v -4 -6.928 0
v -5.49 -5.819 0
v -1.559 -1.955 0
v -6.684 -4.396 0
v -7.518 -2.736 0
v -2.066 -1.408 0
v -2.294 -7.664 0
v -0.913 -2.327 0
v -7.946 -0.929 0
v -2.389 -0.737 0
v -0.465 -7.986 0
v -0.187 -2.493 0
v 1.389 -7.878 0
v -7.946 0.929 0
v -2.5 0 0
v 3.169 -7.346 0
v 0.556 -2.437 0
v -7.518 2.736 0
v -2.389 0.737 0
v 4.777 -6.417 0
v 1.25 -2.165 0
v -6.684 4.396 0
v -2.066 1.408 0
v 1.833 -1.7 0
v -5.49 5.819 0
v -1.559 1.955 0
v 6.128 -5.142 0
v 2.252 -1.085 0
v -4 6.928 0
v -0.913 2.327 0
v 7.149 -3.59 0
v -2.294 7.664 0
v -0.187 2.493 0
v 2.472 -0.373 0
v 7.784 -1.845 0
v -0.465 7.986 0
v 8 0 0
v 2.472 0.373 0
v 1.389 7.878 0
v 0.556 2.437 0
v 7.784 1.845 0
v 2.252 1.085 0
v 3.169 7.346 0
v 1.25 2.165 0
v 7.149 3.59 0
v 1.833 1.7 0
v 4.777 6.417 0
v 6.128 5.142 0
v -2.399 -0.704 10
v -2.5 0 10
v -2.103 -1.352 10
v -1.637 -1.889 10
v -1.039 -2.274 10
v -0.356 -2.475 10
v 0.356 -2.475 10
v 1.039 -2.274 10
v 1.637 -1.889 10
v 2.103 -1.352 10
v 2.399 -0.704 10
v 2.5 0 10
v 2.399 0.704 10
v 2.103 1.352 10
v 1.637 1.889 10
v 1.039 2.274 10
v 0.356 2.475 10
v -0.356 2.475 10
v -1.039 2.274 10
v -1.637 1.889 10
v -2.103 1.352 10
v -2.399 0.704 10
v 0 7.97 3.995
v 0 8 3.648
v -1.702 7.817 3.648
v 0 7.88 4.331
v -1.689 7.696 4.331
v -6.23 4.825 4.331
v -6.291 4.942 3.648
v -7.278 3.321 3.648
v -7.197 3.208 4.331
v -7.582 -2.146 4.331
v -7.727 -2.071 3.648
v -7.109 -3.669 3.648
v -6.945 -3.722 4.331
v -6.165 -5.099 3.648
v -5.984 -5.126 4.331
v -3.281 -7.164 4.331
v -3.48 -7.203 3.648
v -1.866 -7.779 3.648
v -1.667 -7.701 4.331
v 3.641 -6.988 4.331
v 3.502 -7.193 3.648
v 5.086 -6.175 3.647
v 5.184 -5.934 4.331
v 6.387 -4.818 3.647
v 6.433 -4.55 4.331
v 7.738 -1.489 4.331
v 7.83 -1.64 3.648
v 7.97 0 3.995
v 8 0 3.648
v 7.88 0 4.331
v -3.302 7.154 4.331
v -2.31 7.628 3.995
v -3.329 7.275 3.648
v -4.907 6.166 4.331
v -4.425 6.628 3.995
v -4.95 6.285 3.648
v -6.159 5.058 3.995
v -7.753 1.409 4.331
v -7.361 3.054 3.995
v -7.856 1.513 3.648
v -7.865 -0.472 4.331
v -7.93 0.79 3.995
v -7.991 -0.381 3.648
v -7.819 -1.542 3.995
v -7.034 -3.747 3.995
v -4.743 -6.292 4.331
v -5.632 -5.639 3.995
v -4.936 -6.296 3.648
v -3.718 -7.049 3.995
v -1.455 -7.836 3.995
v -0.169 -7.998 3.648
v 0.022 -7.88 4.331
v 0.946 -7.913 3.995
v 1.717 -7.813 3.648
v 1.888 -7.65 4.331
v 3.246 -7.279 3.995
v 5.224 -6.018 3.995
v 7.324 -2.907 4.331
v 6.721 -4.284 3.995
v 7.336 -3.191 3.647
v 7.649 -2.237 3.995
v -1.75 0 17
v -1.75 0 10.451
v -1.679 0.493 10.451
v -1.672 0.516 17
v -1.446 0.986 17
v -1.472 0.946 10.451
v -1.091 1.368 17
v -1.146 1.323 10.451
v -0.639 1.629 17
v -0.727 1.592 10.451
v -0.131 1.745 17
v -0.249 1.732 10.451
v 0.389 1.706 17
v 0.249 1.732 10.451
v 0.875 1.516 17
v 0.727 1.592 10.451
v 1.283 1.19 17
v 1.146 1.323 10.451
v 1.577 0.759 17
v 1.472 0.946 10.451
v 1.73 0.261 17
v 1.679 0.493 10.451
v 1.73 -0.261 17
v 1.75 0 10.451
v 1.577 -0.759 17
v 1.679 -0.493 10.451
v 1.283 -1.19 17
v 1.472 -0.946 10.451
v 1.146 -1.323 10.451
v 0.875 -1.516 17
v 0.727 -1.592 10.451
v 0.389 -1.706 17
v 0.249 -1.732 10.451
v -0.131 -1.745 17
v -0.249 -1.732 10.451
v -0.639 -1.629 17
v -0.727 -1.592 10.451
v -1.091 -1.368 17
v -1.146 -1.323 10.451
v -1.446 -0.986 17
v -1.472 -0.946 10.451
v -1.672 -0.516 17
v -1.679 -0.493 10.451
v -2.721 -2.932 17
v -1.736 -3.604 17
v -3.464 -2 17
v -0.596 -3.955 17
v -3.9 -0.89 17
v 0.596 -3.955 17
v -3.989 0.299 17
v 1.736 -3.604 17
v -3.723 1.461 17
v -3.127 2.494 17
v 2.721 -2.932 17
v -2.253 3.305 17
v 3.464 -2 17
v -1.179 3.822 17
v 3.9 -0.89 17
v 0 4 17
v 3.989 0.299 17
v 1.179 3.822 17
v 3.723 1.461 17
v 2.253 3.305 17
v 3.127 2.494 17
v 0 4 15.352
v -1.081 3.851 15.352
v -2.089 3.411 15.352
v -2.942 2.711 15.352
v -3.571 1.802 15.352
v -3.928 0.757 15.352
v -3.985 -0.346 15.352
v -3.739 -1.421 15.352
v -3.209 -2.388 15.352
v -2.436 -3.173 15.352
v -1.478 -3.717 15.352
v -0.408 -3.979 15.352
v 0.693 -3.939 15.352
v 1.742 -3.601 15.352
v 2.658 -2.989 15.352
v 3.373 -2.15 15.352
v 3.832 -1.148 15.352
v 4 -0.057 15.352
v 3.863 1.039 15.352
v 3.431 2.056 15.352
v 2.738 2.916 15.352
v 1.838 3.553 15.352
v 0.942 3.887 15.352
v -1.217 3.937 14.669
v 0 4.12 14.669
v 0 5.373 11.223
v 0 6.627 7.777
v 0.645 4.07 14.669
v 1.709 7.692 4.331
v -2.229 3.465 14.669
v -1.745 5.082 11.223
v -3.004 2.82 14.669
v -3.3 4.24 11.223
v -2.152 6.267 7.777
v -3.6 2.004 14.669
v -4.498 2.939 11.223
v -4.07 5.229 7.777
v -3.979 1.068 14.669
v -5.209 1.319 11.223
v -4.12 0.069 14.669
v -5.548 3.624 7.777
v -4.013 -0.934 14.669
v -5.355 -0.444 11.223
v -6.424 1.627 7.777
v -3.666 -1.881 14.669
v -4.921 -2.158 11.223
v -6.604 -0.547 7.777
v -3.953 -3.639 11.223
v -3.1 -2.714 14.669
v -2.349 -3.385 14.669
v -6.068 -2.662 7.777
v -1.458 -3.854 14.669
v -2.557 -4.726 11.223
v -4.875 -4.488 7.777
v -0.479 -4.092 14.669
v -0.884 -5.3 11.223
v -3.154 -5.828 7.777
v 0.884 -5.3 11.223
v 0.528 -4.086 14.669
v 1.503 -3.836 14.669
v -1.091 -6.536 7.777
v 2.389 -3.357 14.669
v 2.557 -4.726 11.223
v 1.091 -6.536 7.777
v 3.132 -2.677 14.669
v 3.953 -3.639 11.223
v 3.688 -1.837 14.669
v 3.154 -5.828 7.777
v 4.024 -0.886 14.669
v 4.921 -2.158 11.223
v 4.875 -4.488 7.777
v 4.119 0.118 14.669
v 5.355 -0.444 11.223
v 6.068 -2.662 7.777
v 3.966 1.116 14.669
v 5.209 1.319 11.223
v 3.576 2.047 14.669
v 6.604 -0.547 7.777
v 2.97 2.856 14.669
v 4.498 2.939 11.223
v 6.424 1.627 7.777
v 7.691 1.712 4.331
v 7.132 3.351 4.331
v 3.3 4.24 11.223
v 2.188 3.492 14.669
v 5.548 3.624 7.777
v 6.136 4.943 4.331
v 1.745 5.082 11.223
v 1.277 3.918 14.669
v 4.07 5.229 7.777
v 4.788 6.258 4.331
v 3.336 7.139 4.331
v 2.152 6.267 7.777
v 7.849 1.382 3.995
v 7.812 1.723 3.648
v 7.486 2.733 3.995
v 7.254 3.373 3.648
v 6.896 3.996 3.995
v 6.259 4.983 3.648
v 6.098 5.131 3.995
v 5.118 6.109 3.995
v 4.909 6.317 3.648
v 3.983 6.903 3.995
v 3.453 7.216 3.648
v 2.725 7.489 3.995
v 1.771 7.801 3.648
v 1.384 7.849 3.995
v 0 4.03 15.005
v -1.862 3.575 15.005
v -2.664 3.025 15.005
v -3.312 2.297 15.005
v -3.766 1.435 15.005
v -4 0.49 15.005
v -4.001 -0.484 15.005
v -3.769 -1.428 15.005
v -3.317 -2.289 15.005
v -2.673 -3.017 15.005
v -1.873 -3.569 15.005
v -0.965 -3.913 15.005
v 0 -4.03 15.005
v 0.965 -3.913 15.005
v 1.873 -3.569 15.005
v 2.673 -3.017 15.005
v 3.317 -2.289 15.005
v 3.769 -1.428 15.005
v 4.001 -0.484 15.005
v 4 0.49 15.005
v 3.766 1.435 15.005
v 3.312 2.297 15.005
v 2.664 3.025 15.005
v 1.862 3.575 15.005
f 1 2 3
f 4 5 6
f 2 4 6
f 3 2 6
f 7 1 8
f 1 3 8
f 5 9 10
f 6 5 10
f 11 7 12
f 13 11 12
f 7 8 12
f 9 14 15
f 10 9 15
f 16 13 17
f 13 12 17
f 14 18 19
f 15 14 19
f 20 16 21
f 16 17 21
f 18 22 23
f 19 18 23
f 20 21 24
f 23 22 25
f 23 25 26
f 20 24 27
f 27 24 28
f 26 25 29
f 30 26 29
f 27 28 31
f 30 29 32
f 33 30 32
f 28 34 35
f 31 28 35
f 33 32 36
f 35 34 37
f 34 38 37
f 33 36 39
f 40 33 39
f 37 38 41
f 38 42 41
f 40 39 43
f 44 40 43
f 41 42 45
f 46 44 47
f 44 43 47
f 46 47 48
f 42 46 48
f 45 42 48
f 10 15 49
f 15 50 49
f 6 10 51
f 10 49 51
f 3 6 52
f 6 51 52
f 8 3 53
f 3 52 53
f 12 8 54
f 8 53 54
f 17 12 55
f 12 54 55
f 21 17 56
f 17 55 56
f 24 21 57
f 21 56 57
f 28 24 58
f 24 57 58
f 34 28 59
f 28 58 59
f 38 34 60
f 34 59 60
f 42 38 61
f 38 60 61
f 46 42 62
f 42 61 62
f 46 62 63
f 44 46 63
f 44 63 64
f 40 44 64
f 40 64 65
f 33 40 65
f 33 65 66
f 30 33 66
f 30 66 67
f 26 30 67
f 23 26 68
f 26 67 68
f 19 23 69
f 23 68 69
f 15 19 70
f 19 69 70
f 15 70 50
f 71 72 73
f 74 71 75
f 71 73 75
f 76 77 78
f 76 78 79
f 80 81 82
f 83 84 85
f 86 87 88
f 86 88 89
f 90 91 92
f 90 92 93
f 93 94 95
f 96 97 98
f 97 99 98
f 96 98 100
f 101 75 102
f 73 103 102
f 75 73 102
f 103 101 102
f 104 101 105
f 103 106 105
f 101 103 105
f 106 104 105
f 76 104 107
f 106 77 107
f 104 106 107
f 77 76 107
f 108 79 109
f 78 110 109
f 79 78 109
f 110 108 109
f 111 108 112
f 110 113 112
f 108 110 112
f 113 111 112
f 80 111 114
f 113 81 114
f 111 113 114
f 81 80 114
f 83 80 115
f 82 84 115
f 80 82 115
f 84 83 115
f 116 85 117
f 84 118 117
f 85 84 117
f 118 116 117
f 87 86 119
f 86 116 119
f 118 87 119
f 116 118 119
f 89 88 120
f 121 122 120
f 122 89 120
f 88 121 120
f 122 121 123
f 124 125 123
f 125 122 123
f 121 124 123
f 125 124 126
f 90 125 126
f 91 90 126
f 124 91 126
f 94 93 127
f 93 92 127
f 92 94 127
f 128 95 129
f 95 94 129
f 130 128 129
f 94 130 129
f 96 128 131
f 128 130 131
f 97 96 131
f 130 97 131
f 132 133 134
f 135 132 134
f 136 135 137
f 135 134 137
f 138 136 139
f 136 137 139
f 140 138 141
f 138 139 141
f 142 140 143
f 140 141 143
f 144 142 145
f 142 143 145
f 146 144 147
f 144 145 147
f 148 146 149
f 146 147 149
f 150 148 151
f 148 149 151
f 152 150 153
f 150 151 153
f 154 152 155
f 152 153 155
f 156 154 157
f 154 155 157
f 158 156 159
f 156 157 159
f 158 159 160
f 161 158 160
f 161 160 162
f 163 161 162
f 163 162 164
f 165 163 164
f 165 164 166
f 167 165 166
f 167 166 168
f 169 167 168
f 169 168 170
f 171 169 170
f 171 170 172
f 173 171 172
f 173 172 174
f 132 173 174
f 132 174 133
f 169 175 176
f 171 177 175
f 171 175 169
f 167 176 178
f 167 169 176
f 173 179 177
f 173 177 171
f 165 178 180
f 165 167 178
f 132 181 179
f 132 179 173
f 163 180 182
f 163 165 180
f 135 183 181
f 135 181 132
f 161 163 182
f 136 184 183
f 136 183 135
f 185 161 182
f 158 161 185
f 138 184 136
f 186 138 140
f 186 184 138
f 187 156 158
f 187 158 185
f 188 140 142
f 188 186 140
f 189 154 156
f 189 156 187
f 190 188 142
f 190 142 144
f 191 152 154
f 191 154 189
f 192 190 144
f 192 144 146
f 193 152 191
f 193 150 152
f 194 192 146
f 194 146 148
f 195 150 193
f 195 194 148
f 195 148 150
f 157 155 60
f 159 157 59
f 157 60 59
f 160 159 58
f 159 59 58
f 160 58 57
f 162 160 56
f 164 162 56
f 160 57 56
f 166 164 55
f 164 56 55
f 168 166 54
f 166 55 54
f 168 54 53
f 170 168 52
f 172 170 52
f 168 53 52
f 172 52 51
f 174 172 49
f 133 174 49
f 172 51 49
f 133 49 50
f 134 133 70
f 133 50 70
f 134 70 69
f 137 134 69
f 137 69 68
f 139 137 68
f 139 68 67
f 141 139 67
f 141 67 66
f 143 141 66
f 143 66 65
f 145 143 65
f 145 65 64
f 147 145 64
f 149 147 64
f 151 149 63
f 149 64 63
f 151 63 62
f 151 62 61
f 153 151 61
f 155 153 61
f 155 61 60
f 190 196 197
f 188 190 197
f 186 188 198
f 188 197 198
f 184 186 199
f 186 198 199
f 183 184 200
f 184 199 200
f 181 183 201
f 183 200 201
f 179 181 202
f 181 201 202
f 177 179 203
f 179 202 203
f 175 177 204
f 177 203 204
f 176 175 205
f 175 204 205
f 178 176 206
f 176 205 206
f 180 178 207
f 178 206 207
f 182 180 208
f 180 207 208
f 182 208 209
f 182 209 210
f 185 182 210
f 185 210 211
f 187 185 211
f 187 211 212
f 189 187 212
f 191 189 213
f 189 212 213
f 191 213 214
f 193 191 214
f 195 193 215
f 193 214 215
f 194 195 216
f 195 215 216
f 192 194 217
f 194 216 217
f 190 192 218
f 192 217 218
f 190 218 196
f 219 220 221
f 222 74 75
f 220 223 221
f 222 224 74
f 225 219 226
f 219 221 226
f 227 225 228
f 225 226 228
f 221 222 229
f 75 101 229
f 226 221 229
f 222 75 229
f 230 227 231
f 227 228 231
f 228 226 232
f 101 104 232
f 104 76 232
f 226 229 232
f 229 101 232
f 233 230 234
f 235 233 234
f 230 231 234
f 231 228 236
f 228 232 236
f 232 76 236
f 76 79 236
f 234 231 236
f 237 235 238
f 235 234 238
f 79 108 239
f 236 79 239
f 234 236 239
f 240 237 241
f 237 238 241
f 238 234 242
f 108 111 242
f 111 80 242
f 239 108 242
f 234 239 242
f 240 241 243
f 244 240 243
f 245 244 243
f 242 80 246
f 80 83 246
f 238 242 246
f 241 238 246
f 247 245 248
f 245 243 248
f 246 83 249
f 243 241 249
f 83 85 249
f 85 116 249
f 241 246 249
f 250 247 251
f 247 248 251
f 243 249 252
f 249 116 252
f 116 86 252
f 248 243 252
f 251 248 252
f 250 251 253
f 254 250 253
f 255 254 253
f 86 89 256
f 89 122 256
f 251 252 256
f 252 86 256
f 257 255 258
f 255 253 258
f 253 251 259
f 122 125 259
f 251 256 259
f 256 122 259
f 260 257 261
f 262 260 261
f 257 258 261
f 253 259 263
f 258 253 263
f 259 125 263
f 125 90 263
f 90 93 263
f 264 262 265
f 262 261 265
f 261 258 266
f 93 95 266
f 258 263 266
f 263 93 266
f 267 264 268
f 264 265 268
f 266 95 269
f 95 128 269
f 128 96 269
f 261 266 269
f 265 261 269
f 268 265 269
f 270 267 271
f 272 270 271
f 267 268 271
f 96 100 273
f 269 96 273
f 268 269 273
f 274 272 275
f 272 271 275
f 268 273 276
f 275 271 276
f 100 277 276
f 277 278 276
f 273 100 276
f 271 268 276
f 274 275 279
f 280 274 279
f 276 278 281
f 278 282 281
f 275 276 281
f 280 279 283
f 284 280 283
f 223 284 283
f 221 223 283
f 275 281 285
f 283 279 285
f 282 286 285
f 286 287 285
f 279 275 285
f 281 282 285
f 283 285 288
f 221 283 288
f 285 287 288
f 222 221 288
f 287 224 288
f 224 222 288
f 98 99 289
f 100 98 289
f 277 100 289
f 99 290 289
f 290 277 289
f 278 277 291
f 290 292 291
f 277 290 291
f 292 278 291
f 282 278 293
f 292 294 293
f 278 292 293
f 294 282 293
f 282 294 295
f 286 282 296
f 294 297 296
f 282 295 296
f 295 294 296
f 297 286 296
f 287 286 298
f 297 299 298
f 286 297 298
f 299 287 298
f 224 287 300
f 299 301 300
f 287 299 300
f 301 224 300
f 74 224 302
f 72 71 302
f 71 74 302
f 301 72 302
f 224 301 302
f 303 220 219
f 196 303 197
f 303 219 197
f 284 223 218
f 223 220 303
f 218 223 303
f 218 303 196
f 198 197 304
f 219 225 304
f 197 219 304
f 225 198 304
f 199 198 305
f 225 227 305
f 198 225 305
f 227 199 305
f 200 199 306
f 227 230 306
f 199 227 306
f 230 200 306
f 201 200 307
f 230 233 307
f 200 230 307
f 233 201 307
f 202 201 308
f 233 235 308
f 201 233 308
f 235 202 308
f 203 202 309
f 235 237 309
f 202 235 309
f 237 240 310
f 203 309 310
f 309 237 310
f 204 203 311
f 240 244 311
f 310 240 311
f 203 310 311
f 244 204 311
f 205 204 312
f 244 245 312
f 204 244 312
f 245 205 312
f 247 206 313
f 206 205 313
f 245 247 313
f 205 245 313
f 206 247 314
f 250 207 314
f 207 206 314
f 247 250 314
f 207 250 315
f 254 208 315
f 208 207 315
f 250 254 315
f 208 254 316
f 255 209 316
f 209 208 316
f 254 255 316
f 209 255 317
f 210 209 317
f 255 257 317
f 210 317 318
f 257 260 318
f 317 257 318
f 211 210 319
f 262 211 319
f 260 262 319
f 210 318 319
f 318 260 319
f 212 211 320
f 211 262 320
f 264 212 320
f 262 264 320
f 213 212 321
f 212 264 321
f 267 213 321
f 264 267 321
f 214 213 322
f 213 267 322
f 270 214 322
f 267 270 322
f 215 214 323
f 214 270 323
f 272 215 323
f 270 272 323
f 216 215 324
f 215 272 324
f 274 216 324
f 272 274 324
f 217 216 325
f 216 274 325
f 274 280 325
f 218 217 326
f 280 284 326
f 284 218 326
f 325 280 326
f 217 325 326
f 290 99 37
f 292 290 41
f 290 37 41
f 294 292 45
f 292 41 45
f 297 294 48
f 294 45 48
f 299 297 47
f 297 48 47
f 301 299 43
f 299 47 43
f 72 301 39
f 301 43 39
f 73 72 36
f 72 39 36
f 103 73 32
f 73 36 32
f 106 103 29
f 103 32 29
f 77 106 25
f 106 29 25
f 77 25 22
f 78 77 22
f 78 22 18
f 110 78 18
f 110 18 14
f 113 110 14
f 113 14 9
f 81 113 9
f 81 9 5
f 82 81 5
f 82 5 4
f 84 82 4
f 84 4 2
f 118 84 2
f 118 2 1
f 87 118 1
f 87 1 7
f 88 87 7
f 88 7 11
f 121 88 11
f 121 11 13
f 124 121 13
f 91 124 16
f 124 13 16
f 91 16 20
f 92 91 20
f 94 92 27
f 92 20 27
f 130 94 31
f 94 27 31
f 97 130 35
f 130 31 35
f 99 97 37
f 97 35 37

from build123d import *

# Parameters (mm, degrees)
F0_R     = 8
F1_DEPTH = 17
F5_D     = 3.5
F7_D     = 5
F7_DEPTH = 10
F7_TIP   = 1.5021515476
F8_R     = 2


with BuildPart() as f1:
    # F0 (on Top) → F1 (new body)
    with BuildSketch(Plane.XY):
        Circle(F0_R)
    extrude(amount=F1_DEPTH)

    # F2 (on Right) → F3 (revolve, cut)
    with BuildSketch(Plane.YZ):
        Polygon((4, 15), (8, 4), (8, 17), (4, 17), align=None)
    revolve(axis=Axis((0, 0, 9.1980583966), (0, 0, 1)), mode=Mode.SUBTRACT)

    # F5 (through all)
    with Locations(Plane.XY.offset(17)):
        with Locations((0, 0)):
            Hole(F5_D / 2)

    # F7
    with Locations(Plane(origin=(0, 0, 0), x_dir=(1, 0, 0), z_dir=(0, 0, -1))):
        with Locations((0, 0)):
            Hole(F7_D / 2, depth=F7_DEPTH)
            with Locations((0, 0, -(F7_DEPTH + F7_TIP / 2))):  # 118° drill point
                Cone(0, F7_D / 2, F7_TIP, mode=Mode.SUBTRACT)

    # F8
    f8_edges = [f1.edges().sort_by_distance(p)[0] for p in [
        (0, 6, 9.5),
        (-5.656854, -5.656854, 4),
        (5.656854, 5.656854, 4),
        (0, -4, 15),
    ]]
    fillet(f8_edges, radius=F8_R)


solid = f1.part
